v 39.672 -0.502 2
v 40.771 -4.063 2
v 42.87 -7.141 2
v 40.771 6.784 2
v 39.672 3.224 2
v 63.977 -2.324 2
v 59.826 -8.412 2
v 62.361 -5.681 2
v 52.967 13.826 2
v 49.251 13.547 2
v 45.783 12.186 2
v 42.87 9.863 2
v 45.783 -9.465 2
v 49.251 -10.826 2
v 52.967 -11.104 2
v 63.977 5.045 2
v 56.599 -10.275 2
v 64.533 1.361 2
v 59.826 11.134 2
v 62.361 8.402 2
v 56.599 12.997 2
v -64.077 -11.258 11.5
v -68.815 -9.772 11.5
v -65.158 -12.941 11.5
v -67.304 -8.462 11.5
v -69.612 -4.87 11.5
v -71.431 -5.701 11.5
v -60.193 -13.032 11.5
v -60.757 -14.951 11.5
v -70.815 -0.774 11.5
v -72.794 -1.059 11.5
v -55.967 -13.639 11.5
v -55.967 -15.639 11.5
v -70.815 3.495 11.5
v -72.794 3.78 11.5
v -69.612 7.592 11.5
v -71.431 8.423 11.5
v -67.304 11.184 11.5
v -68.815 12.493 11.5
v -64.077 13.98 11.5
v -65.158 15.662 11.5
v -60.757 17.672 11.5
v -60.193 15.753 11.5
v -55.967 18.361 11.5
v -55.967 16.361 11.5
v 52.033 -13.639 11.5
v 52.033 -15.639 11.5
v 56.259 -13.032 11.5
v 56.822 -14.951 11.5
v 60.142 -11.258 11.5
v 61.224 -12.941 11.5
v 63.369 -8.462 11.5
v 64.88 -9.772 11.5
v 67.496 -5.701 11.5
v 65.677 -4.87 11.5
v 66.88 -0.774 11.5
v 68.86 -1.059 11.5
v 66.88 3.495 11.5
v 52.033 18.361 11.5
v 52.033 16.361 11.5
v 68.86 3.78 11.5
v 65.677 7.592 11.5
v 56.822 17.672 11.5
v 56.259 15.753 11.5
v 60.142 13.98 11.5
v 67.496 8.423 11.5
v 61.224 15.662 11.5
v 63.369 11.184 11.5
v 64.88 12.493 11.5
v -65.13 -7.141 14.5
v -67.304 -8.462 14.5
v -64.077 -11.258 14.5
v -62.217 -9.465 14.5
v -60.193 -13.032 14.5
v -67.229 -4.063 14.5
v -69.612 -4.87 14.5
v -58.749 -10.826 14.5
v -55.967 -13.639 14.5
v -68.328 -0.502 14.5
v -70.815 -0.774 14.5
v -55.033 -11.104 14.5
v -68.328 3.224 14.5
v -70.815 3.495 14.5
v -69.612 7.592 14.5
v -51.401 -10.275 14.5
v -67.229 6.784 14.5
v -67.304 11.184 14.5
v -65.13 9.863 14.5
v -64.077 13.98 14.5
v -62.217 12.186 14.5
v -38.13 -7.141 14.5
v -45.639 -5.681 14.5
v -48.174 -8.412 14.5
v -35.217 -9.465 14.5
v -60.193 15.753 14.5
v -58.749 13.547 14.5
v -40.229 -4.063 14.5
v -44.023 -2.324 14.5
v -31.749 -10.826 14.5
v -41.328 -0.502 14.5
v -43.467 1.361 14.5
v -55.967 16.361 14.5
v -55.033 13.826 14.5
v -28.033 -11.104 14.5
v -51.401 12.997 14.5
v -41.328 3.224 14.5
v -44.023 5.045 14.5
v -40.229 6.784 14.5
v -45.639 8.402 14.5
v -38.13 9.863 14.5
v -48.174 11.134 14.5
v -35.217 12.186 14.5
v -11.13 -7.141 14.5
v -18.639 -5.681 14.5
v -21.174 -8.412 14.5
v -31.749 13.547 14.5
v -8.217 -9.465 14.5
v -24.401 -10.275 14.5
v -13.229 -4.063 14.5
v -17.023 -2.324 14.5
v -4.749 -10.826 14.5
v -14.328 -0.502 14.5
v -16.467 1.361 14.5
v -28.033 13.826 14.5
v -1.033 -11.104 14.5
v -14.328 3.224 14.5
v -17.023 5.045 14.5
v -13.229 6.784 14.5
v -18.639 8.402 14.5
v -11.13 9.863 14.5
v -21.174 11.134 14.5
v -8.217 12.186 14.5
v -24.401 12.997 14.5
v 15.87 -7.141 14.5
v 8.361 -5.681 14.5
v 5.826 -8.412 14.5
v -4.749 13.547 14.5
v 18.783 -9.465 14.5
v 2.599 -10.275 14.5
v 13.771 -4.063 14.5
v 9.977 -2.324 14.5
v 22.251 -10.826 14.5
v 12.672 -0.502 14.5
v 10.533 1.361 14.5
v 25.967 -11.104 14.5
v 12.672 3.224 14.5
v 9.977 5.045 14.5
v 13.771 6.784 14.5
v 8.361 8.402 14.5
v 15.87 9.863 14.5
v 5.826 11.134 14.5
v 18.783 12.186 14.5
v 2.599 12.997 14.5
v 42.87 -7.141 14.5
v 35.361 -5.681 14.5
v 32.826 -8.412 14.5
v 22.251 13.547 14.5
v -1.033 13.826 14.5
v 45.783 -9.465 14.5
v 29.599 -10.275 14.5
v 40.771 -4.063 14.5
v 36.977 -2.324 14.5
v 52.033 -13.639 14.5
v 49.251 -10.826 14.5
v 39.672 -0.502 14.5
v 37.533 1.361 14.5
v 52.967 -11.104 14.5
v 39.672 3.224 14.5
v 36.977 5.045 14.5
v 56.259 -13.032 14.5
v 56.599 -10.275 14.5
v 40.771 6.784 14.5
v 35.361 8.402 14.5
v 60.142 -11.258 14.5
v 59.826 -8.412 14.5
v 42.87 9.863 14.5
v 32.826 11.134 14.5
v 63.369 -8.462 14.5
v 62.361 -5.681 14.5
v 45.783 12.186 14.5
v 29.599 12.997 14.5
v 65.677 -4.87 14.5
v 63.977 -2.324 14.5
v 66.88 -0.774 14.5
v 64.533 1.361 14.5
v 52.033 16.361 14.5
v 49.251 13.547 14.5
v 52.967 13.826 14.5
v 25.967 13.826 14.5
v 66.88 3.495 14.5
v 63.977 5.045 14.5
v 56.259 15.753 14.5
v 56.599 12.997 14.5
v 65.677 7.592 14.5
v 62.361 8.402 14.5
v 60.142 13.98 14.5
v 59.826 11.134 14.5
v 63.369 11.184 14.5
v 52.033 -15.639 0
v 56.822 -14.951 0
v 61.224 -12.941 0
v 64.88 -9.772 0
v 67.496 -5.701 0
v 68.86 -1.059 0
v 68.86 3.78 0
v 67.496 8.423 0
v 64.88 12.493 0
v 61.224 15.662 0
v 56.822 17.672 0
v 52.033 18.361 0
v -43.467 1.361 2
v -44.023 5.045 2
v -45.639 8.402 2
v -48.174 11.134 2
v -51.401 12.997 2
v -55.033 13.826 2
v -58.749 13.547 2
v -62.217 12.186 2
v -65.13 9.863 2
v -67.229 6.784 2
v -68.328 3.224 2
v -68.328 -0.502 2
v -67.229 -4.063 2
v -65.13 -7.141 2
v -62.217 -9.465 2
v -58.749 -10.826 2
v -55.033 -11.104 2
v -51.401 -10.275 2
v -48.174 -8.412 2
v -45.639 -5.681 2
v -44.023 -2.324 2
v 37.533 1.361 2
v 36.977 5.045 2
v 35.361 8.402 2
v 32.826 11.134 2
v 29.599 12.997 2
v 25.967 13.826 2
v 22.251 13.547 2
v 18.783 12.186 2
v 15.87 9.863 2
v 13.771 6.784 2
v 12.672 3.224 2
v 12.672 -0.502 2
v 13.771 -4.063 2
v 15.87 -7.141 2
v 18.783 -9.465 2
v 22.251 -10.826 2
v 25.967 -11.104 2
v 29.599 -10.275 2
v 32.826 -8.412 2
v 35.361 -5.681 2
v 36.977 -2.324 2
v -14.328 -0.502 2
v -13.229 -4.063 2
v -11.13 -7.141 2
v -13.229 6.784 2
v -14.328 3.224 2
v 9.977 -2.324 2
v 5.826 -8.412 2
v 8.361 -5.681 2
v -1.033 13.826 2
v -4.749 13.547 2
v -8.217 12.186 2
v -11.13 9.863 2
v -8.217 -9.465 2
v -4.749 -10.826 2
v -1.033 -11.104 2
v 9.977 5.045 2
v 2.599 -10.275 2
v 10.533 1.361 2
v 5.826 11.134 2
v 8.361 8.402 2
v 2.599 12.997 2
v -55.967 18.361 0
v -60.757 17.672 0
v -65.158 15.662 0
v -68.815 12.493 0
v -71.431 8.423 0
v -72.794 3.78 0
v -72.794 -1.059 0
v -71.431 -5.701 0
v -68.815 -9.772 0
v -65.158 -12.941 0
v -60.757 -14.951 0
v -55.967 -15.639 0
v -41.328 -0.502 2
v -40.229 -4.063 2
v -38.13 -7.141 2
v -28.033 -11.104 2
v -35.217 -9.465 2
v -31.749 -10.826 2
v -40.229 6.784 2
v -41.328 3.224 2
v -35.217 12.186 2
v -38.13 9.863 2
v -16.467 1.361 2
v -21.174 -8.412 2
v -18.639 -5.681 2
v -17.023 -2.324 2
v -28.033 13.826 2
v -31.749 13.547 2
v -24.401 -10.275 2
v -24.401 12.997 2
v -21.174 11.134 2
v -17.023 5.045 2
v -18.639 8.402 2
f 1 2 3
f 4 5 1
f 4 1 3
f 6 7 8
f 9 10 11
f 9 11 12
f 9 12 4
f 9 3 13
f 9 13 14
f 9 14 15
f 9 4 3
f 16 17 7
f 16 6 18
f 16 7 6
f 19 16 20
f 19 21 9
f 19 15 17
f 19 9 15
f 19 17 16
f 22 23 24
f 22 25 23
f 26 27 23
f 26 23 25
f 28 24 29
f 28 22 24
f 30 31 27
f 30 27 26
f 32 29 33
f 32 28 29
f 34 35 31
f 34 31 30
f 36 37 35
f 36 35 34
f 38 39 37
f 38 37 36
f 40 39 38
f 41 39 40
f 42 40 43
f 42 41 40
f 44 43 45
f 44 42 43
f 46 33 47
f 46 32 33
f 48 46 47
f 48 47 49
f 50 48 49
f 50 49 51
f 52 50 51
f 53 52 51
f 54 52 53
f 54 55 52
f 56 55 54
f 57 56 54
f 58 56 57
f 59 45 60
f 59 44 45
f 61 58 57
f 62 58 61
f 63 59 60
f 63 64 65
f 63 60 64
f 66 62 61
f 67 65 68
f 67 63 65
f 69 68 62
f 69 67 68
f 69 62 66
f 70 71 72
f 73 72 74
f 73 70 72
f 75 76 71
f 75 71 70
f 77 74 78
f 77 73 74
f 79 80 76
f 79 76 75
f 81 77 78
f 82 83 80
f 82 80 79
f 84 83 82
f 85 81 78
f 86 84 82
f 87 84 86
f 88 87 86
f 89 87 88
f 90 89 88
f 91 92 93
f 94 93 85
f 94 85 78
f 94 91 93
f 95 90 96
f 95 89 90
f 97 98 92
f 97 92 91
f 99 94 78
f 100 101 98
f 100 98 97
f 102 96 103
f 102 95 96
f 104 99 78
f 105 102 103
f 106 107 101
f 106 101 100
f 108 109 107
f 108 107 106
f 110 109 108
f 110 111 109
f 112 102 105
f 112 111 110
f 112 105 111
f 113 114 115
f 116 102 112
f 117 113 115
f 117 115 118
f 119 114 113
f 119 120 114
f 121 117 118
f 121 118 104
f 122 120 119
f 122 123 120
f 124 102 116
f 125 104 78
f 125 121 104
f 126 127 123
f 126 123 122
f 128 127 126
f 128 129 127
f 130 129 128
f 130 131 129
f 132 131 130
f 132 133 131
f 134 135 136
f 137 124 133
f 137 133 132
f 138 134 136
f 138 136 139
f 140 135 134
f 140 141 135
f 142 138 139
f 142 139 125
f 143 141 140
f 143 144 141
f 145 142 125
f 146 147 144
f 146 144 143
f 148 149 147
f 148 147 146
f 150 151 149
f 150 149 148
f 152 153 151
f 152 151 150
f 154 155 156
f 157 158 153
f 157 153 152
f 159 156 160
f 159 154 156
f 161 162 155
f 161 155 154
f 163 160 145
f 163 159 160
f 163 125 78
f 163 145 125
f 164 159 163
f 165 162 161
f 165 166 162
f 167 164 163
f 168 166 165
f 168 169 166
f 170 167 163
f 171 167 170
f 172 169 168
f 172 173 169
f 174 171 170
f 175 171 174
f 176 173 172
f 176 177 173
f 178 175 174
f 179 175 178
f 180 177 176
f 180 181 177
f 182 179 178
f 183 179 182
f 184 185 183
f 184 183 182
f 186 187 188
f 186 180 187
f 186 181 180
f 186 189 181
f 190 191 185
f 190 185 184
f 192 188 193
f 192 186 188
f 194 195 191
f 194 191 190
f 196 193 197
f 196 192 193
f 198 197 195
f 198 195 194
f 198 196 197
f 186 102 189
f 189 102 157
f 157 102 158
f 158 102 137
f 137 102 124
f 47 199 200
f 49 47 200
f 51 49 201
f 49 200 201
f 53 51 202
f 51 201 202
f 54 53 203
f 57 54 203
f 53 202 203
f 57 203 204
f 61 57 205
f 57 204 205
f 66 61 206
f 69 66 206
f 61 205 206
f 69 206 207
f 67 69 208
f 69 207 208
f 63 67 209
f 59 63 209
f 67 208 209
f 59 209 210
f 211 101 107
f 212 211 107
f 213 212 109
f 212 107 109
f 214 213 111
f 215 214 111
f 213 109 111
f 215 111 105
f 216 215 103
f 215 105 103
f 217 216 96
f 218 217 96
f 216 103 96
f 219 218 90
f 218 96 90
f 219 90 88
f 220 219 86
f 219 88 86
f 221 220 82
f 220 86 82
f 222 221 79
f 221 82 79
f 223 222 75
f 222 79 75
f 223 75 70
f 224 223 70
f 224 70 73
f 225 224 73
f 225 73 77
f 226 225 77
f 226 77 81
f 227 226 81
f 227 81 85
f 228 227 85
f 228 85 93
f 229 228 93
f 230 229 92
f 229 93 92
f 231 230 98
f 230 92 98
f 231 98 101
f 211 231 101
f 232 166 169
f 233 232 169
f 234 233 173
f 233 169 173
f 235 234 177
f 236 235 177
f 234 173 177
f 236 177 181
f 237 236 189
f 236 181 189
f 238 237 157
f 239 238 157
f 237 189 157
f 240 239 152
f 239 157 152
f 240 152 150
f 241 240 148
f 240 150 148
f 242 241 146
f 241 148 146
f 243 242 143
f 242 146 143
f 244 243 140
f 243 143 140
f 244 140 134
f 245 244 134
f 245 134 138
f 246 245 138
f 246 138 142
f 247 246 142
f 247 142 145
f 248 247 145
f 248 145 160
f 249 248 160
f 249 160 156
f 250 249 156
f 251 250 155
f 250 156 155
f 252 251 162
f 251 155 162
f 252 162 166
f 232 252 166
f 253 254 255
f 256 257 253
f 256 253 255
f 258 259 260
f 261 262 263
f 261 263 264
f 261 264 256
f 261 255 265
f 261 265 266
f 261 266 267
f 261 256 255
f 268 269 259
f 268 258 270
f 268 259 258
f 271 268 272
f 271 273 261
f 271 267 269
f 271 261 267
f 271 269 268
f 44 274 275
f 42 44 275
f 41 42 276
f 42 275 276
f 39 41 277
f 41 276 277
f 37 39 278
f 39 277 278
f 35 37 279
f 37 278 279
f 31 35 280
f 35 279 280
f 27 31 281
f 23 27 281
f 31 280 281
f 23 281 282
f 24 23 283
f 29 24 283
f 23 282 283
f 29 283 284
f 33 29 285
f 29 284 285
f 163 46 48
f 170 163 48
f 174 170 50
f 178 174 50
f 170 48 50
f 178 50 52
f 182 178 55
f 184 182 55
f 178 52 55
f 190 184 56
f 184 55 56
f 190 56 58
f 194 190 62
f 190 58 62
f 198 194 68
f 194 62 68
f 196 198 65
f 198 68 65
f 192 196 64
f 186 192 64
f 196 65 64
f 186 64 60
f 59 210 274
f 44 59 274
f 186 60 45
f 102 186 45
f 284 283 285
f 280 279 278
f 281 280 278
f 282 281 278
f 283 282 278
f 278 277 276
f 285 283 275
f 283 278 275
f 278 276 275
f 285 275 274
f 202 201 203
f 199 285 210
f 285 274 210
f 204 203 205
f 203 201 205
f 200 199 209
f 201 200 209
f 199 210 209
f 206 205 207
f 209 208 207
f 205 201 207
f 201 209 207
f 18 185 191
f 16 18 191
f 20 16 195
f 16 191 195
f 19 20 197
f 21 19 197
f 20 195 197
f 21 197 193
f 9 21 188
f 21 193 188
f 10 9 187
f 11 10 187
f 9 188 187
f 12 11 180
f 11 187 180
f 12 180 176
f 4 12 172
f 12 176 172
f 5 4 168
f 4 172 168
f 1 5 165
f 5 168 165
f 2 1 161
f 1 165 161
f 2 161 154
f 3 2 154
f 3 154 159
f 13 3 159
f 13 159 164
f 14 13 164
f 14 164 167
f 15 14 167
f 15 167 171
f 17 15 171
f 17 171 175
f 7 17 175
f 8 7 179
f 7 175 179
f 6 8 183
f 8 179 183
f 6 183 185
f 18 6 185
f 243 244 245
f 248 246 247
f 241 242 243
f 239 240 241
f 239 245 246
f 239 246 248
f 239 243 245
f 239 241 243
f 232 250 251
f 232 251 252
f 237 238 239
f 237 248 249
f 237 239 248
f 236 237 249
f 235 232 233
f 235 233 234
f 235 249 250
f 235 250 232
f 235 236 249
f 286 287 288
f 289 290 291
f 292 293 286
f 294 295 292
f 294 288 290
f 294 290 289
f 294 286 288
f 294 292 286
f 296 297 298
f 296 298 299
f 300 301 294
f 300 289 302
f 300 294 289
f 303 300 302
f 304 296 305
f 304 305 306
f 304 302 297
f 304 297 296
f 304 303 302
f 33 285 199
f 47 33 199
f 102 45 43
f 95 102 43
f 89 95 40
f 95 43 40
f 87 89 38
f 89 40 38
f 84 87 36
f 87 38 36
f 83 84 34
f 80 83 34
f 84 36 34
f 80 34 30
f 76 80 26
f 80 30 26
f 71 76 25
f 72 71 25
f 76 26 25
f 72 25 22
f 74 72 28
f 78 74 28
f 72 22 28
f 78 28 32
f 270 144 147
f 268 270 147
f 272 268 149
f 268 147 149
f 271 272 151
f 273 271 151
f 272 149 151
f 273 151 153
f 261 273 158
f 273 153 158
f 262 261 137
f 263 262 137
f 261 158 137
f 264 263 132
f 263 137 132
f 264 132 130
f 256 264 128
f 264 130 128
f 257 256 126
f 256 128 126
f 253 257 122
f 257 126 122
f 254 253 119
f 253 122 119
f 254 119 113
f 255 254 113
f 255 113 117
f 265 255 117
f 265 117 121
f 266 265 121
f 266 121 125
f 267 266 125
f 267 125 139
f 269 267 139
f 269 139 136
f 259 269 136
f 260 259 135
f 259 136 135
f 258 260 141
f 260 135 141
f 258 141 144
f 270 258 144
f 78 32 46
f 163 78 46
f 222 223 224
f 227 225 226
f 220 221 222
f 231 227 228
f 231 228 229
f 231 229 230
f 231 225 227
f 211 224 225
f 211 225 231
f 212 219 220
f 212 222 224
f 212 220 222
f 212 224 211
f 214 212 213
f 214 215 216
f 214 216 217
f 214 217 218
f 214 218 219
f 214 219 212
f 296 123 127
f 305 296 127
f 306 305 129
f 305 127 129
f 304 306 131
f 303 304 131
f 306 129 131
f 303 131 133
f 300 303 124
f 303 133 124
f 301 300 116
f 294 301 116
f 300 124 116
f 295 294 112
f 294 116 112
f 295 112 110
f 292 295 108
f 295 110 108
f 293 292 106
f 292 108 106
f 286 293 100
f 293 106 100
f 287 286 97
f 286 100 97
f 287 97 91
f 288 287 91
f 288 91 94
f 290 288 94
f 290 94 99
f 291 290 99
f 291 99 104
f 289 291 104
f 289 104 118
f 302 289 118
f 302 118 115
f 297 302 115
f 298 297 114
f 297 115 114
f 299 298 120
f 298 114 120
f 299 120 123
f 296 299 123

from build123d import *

# Parameters (mm, degrees)
F1_DEPTH = 11.5
F3_DEPTH = 3
F4_R     = 12.5
F5_DEPTH = 12.5


with BuildPart() as f1:
    # F0 (on Top) → F1 (new body)
    with BuildSketch(Plane.XY):
        with BuildLine():
            Line((52.032723, 18.360732), (-55.967277, 18.360732))
            ThreePointArc((-55.967277, 18.360732), (-72.967277, 1.360732), (-55.967277, -15.639268))
            Line((-55.967277, -15.639268), (52.032723, -15.639268))
            ThreePointArc((52.032723, -15.639268), (69.032723, 1.360732), (52.032723, 18.360732))
        make_face()
    extrude(amount=F1_DEPTH)

    # F2 (on face) → F3 (join)
    with BuildSketch(Plane.XY.offset(11.5)):
        with BuildLine():
            ThreePointArc((52.032723, -13.639268), (67.032723, 1.360732), (52.032723, 16.360732))
            Line((52.032723, 16.360732), (-55.967277, 16.360732))
            ThreePointArc((-55.967277, 16.360732), (-70.967277, 1.360732), (-55.967277, -13.639268))
            Line((-55.967277, -13.639268), (52.032723, -13.639268))
        make_face()
    extrude(amount=F3_DEPTH)

    # F4 (on face) → F5 (cut)
    with BuildSketch(Plane.XY.offset(14.5)):
        with Locations((-55.967277, 1.360732)):
            Circle(F4_R)
        with Locations((-28.967277, 1.360732)):
            Circle(F4_R)
        with Locations((-1.967277, 1.360732)):
            Circle(F4_R)
        with Locations((25.032723, 1.360732)):
            Circle(F4_R)
        with Locations((52.032723, 1.360732)):
            Circle(F4_R)
    extrude(amount=-F5_DEPTH, mode=Mode.SUBTRACT)


solid = f1.part
